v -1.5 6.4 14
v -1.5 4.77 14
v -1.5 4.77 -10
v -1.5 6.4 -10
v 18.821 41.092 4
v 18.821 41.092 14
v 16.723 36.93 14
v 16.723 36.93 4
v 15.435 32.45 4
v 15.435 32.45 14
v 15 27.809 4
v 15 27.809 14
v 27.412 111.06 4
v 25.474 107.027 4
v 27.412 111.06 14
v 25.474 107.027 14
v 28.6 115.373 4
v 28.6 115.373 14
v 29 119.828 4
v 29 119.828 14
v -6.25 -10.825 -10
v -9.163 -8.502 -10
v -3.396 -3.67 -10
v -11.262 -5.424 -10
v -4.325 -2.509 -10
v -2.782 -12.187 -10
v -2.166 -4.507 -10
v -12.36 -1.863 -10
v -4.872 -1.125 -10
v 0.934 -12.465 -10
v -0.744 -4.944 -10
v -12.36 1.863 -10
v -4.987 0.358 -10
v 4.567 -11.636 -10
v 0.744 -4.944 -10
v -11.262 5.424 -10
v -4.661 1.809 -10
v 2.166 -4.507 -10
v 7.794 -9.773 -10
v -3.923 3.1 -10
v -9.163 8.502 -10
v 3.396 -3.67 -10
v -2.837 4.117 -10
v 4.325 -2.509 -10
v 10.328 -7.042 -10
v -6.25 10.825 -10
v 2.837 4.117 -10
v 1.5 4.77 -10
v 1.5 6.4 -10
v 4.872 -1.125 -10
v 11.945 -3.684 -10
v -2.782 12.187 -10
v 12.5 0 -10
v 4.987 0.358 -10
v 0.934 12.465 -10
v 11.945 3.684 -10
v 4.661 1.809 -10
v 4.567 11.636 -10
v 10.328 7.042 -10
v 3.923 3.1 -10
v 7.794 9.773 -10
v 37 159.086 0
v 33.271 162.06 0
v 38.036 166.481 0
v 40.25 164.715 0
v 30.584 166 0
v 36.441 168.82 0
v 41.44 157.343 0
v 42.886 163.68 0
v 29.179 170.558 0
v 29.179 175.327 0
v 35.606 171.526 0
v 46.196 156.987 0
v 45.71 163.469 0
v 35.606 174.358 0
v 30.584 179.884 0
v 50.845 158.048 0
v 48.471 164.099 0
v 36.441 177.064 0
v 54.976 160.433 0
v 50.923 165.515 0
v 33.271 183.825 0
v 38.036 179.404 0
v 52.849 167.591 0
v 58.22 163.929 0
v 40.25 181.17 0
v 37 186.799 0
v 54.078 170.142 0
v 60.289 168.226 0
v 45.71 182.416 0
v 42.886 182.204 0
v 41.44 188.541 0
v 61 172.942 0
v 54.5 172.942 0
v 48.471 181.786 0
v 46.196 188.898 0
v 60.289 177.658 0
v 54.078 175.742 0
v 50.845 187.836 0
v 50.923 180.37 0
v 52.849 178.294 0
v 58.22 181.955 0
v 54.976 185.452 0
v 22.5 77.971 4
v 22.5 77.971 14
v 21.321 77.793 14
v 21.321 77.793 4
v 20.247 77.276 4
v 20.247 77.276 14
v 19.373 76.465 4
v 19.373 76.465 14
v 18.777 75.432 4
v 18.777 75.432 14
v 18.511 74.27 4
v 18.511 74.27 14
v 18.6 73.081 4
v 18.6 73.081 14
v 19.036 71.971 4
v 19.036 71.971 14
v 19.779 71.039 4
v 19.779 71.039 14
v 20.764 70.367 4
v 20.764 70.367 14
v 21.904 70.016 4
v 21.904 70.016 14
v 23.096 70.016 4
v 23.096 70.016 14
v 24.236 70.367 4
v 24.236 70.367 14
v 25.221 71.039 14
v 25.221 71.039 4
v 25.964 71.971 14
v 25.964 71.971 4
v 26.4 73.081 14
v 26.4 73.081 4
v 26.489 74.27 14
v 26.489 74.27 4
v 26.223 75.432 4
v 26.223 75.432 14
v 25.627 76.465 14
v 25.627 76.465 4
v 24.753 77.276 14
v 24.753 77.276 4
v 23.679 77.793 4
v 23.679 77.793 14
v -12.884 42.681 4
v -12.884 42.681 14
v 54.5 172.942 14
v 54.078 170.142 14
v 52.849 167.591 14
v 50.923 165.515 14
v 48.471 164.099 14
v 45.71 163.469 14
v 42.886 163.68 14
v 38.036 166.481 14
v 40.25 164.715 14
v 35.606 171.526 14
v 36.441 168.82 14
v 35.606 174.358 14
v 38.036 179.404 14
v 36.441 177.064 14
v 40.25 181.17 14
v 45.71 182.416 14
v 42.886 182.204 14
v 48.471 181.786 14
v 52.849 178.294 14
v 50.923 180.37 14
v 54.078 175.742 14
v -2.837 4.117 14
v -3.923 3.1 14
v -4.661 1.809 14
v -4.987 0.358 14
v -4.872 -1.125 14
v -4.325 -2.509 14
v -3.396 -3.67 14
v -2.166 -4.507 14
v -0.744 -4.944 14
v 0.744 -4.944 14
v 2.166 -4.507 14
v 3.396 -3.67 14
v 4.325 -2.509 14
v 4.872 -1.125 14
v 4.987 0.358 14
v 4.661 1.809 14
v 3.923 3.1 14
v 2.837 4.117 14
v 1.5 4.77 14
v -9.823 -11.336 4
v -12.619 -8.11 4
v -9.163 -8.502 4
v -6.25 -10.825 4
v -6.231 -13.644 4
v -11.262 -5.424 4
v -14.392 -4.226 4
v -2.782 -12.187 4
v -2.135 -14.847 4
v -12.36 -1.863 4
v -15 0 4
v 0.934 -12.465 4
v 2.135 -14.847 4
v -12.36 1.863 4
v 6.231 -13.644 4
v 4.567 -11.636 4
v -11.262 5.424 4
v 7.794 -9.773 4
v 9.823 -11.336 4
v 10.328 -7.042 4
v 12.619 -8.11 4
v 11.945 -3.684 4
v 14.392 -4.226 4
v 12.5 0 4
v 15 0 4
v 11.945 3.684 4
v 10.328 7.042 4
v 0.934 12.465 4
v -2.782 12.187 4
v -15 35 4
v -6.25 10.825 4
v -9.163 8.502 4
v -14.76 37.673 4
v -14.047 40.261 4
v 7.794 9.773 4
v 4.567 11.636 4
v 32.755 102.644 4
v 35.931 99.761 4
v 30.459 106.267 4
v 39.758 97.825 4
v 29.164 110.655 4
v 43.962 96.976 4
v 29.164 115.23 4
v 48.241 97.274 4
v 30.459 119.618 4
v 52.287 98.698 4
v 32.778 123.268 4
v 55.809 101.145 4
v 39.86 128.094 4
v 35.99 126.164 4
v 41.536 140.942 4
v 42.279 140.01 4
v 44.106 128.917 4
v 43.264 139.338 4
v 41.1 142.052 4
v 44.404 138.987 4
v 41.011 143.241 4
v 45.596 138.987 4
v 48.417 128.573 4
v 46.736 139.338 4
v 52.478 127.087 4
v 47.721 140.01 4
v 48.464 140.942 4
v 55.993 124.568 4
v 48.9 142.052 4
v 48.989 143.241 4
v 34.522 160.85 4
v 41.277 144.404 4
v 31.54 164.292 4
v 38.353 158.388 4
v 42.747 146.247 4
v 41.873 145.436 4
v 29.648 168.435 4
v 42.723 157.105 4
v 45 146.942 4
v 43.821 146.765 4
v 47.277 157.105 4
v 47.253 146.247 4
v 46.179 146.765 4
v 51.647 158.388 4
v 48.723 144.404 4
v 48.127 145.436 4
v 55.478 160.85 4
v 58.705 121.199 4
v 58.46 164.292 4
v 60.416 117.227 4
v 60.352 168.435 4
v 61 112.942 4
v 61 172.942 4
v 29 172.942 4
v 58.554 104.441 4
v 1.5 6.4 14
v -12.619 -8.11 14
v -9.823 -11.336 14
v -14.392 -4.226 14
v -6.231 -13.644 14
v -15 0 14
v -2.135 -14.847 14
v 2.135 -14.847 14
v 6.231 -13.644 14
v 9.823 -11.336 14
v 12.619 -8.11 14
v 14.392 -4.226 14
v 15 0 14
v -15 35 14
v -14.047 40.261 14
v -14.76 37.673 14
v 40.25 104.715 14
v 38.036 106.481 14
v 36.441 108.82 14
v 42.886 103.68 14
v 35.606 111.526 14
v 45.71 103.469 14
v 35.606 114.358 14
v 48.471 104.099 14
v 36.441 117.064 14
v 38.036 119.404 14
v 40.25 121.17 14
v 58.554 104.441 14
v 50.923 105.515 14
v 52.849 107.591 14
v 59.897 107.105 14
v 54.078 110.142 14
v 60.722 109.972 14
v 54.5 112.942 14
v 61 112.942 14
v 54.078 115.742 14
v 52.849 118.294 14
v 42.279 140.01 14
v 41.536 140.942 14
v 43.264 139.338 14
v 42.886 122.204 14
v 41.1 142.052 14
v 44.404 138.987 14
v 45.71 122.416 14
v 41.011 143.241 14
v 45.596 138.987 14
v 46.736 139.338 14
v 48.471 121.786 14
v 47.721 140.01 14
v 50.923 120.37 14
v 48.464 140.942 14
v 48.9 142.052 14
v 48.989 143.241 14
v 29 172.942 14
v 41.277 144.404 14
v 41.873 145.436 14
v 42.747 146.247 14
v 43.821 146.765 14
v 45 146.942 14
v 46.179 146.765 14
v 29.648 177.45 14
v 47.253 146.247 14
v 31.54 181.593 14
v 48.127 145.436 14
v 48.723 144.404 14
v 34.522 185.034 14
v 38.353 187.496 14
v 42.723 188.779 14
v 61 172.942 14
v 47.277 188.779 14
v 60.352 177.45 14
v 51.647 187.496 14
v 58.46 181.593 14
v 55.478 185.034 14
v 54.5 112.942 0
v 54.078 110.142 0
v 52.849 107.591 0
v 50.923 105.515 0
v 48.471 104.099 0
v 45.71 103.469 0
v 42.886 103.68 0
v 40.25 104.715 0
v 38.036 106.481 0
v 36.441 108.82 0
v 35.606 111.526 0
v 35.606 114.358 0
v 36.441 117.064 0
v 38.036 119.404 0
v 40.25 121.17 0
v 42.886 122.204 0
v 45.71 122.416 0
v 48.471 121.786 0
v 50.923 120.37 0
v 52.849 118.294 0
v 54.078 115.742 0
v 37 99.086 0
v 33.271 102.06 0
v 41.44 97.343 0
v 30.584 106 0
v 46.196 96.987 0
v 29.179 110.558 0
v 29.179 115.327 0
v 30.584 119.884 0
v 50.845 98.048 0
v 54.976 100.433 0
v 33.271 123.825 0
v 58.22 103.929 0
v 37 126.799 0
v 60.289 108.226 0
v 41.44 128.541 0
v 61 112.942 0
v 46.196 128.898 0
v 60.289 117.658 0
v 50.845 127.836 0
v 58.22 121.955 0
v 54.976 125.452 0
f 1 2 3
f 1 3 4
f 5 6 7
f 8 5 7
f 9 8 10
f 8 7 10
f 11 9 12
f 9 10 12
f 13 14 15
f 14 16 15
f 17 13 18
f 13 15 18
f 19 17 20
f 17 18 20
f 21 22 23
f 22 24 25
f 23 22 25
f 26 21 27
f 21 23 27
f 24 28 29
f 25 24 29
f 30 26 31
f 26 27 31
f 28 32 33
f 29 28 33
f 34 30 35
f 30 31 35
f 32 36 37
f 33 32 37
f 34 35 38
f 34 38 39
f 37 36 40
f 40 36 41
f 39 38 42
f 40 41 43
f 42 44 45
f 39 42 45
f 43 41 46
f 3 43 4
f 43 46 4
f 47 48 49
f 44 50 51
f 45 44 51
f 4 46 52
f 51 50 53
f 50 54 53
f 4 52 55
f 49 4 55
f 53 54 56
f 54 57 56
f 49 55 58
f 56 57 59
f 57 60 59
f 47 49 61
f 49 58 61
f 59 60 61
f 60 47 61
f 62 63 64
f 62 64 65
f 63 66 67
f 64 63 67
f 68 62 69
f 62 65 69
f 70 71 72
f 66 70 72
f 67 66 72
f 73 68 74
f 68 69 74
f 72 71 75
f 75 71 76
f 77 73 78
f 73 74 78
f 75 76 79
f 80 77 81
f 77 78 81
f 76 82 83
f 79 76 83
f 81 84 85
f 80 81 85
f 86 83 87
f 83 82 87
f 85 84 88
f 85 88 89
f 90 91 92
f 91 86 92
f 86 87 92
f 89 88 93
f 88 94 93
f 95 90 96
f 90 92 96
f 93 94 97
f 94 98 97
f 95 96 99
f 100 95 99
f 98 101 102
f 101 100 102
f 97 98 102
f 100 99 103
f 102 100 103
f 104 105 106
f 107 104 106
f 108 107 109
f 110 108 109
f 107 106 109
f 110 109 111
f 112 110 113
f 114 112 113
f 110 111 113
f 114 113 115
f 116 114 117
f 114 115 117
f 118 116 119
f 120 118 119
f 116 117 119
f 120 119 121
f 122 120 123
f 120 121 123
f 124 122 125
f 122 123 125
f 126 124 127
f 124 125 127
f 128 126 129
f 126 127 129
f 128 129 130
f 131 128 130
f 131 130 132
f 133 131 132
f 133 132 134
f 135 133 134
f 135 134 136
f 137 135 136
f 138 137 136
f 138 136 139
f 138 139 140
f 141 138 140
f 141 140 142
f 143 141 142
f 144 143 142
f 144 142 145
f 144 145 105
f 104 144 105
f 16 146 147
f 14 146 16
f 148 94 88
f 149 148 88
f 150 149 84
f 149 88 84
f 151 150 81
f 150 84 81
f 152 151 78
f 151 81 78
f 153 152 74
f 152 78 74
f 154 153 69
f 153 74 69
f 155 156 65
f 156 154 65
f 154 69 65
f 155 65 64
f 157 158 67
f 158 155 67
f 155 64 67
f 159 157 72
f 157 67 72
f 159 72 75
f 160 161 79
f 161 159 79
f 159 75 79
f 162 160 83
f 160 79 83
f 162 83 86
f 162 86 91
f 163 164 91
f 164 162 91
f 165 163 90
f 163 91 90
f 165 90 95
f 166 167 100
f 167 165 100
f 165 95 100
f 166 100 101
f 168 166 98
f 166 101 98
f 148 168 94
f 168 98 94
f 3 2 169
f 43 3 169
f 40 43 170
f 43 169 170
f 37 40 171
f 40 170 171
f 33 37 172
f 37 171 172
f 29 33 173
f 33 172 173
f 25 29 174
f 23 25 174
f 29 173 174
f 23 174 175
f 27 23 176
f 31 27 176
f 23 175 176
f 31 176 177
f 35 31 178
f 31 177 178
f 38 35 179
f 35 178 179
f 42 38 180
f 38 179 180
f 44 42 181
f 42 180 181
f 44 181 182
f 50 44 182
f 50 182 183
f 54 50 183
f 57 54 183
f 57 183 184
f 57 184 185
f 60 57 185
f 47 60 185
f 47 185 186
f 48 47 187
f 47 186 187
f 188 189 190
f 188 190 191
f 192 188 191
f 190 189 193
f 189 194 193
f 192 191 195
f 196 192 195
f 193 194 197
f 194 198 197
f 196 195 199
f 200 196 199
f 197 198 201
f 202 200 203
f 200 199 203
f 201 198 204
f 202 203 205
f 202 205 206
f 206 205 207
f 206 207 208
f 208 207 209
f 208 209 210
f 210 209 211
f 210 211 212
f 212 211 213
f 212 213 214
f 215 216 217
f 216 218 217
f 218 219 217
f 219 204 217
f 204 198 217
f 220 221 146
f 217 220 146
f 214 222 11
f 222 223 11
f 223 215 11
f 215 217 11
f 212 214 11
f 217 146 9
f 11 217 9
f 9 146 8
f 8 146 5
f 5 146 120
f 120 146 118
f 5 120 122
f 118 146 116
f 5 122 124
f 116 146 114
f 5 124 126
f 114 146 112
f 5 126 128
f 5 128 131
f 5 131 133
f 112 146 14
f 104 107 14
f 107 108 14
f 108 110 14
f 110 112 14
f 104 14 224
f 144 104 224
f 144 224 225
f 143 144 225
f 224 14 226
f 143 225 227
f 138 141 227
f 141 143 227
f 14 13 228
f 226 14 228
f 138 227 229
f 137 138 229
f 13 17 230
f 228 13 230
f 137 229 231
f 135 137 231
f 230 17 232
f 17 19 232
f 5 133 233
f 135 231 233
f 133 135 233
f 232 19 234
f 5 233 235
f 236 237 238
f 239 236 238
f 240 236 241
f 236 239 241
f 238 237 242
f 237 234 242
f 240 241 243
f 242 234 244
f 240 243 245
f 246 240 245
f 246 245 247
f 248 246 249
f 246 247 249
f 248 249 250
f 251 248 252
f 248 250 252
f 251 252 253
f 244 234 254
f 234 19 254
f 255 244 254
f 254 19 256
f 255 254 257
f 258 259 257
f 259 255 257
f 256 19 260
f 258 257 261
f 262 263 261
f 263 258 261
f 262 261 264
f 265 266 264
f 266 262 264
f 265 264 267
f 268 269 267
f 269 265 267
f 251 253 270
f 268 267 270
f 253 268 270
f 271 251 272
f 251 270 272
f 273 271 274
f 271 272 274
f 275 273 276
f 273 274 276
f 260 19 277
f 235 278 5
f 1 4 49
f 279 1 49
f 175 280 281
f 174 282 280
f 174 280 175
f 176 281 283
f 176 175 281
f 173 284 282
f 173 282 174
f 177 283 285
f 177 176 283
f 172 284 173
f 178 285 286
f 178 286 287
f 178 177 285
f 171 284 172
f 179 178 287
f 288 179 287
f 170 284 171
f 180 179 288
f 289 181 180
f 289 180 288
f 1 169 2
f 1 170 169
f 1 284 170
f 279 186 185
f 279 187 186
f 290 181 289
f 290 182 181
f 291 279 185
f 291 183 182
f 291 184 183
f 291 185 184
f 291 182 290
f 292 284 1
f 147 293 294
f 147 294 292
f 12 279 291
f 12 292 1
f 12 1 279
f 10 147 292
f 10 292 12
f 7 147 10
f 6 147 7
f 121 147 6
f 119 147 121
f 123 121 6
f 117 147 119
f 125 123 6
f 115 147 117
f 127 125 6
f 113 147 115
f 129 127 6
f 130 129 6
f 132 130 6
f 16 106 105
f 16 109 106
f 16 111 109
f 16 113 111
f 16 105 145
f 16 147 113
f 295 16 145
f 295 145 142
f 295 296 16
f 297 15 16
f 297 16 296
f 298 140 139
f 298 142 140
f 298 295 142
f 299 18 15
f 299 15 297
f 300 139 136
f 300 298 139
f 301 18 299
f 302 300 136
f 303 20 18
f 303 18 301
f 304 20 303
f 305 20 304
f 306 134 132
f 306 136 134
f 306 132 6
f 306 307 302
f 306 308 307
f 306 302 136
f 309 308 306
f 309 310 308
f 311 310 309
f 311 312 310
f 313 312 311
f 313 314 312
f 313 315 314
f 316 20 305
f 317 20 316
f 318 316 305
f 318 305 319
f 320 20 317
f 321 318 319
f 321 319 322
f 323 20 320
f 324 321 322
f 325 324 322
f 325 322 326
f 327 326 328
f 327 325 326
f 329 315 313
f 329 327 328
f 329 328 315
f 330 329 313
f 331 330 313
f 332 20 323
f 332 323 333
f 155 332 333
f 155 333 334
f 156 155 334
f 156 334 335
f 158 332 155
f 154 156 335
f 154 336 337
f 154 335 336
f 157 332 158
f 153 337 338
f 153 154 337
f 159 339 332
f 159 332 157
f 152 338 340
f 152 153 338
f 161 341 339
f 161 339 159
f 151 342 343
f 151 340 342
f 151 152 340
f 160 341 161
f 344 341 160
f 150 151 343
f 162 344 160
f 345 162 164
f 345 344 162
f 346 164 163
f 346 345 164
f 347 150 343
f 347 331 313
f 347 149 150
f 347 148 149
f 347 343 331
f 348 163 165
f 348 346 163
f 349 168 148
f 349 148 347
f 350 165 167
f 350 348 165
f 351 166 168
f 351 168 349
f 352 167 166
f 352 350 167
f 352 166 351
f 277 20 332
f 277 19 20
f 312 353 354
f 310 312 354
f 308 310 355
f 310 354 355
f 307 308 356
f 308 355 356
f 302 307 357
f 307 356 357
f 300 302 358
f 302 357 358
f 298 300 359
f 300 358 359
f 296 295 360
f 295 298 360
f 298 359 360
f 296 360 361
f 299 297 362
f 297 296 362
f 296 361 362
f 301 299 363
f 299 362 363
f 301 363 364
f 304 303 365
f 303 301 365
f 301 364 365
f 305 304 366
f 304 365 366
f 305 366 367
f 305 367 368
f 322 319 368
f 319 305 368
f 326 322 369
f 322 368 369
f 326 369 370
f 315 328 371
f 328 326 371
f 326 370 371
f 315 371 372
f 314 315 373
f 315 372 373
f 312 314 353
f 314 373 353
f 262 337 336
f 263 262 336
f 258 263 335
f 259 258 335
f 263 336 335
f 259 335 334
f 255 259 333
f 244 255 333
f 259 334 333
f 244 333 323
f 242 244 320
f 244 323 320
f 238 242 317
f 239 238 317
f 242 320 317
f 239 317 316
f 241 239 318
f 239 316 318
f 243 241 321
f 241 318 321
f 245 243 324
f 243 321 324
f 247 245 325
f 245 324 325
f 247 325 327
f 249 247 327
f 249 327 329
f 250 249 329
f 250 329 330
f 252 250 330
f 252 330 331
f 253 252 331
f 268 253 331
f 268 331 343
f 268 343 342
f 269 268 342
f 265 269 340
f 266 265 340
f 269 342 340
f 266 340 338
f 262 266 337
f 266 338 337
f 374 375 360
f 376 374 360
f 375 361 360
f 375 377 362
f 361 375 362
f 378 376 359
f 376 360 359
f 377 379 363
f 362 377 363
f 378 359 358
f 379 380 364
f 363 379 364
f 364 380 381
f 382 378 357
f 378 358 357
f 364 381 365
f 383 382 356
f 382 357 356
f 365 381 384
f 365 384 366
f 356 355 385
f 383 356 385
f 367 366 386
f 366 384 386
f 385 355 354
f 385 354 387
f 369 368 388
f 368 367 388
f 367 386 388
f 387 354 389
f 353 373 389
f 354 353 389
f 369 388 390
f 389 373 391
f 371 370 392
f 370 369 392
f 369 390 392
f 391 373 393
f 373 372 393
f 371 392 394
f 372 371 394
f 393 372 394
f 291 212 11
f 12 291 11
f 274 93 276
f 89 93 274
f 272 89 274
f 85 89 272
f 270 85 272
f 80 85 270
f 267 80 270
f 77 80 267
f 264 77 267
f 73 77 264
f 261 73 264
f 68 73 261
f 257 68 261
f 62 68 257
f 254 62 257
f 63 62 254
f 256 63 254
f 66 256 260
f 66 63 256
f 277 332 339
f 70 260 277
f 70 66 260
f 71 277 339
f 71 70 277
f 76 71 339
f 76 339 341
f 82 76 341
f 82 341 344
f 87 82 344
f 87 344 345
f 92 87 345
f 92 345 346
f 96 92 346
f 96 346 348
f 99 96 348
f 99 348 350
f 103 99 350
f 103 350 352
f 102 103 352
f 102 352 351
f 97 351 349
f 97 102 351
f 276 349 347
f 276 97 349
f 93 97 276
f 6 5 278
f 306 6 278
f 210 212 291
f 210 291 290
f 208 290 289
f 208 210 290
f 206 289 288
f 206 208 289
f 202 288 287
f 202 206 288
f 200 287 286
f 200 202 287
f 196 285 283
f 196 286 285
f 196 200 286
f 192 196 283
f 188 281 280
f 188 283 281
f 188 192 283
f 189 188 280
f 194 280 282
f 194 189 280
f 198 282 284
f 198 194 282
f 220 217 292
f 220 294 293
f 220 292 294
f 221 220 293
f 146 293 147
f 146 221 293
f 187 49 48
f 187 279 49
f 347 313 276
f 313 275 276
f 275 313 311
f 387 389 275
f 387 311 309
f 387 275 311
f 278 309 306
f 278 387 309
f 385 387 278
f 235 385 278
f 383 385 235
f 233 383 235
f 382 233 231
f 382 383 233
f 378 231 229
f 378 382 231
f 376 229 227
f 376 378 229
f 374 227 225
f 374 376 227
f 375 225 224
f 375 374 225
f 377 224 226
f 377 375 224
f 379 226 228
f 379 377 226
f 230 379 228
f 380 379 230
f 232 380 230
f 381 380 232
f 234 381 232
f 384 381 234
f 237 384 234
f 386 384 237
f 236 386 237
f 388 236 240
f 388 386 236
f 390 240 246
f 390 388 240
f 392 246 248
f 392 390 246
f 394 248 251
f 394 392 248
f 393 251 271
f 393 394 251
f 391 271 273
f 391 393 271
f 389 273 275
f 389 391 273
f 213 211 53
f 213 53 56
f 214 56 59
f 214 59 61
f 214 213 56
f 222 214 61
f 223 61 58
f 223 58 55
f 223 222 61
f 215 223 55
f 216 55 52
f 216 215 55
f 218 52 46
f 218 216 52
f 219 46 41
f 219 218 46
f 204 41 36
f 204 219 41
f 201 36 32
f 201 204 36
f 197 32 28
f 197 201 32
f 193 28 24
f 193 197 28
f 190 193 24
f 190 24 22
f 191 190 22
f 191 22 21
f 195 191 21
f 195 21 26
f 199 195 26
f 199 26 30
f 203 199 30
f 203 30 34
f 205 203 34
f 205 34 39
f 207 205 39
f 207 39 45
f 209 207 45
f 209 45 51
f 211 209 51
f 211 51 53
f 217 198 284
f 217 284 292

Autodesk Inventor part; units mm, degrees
ref_plane "YZ Plane" through (0, 0, 0) normal (1, 0, 0) x (0, 1, 0)
ref_plane "XZ Plane" through (0, 0, 0) normal (0, 1, 0) x (-1, 0, 0)
sketch "Skizze1" plane through (0, 0, 0) normal (0, 0, 1) x (1, 0, 0)
  arc A0 (-1.5, 4.7697) -> (1.5, 4.7697) centre (0, 0) ccw
  circle A1 centre (0, 0) radius 12.5
  line L0 (-30.9429, 0) -> (77.0229, 0) construction
  circle A2 centre (0, 0) radius 15
  circle A3 centre (45, 112.9423) radius 16
  line L1 (61, 112.9423) -> (61, 172.9423)
  line L2 (29, 112.9423) -> (29, 172.9423)
  line L3 (45, 112.9423) -> (45, 188.9423) construction
  line L4 (45, 112.9423) -> (45, 128.9423) construction
  line L5 (29, 112.9423) -> (61, 112.9423) construction
  line L6 (-15, 0) -> (-15, 35)
  line L7 (15, 0) -> (15, 35)
  line L8 (-15, 35) -> (15, 35) construction
  circle A4 centre (0, 35) radius 15 construction
  line L9 (-12.8844, 42.6807) -> (29, 112.9423)
  arc A5 (-12.8844, 42.6807) -> (-15, 35) centre (0, 35) ccw
  line L10 (15, 35) -> (58.5544, 104.4407)
  arc A6 (58.5544, 104.4407) -> (61, 112.9423) centre (45, 112.9423) ccw
  line L11 (0, 35) -> (45, 112.9423) construction
  circle A7 centre (45, 172.9423) radius 16
  circle A8 centre (45, 172.9423) radius 9.5
  circle A9 centre (45, 112.9423) radius 9.5
  line L12 (-1.5, 6.4) -> (1.5, 6.4)
  line L13 (1.5, 6.4) -> (1.5, 4.7697)
  line L14 (-1.5, 4.7697) -> (-1.5, 6.4)
  line L15 (0, 0) -> (0, 5) construction
  line L16 (0, 5) -> (1.5, 5) construction
  circle A10 centre (45, 112.9423) radius 12.75 construction
  circle A11 centre (45, 172.9423) radius 12.75 construction
  line L17 (0, 0) -> (45, 172.9423) construction
  point P0 (22.5, 73.9711)
  point P1 (45, 142.9423)
  point P2 (-13, 0)
  point P3 (13, 0)
  point P4 (0, 6.4)
  point P5 (45, 125.6923)
  point P6 (33.9582, 106.5673)
  point P7 (56.0418, 106.5673)
  point P8 (45, 185.6923)
  point P9 (33.9582, 166.5673)
  point P10 (56.0418, 166.5673)
  dimension "d69" = 25.5
  dimension "ParallelHebel_Passflansch_HoleDia" = 25.5
  dimension "d0" = 10
  dimension "d1" = 25
  dimension "d4" = 30
  dimension "d36" = 0
  dimension "ParallelHebel_Gabelgelenk_OuterDia" = 32
  dimension "d38" = 60
  dimension "d39" = 35
  dimension "d40" = 90
  dimension "d41" = 60
  dimension "d42" = 45
  dimension "d43" = 19
  dimension "Nadellager_OuterDia" = 19
  dimension "d45" = 30
  dimension "d51" = 3
  dimension "d52" = 1.4
  dimension "d67" = 360
  dimension "d72" = 360
  dimension "Distanze_daVinciHead_Pivot" = 172.9423
extrude "Extrusion1" add sketch "Skizze1" against normal blind 10 contours A1
extrude "Extrusion2" add sketch "Skizze1" along normal blind 14 contours A1 | A2 | A2 L6 A5 L9 A3 L10 L7 | A3 | L2 A7 L1 A3 | A7
extrude "Extrusion4" cut sketch "Skizze1" along normal blind 4 contours A2 | A2 L6 A5 L9 A3 L10 L7 | L2 A7 L1 A3
fillet "Rundung1" radius 25 2 edges at (29, 112.9423, 9) (15, 35, 9)
hole "Bohrung2" at (45, 142.9423, 0) at (22.5, 73.9711, 0) direction (0, 0, 1) diameter 8 end through all
ref_plane "Arbeitsebene1" through (45, 112.9423, 0) normal (-1, 0, 0) x (0, 0, 1)
sketch "Skizze4" plane through (15, 0, 14) normal (1, 0, 0) x (0, 0, -1)
  line L0 (24, -12.5) -> (24, 12.5) construction
  line L1 (10, 41.0923) -> (10, 104.4407) construction
  line L2 (0, 41.0923) -> (0, 104.4407) construction
  line L3 (10, 112.9423) -> (10, 172.9423) construction
  line L4 (14, 156.9423) -> (14, 188.9423) construction
  point P0 (14, 0)
  dimension "ParallelMech_Distance_Step2Flat" = 14
  dimension "TrueLeverThickness" = 10
  dimension "ParallelMecha_BearingSide_Step" = 4
equation "\"NKX_10_RiadialPart_Dia\" = 19"
equation "\"Lager_Bohrung_Durchmesser\" = 19"
equation "\"Lager_Einbautiefe\" = 14"
properties part number "ParallelSystem_ProximalPart_Driven_v2.1_AxialNadellager" material "Edelstahl"
